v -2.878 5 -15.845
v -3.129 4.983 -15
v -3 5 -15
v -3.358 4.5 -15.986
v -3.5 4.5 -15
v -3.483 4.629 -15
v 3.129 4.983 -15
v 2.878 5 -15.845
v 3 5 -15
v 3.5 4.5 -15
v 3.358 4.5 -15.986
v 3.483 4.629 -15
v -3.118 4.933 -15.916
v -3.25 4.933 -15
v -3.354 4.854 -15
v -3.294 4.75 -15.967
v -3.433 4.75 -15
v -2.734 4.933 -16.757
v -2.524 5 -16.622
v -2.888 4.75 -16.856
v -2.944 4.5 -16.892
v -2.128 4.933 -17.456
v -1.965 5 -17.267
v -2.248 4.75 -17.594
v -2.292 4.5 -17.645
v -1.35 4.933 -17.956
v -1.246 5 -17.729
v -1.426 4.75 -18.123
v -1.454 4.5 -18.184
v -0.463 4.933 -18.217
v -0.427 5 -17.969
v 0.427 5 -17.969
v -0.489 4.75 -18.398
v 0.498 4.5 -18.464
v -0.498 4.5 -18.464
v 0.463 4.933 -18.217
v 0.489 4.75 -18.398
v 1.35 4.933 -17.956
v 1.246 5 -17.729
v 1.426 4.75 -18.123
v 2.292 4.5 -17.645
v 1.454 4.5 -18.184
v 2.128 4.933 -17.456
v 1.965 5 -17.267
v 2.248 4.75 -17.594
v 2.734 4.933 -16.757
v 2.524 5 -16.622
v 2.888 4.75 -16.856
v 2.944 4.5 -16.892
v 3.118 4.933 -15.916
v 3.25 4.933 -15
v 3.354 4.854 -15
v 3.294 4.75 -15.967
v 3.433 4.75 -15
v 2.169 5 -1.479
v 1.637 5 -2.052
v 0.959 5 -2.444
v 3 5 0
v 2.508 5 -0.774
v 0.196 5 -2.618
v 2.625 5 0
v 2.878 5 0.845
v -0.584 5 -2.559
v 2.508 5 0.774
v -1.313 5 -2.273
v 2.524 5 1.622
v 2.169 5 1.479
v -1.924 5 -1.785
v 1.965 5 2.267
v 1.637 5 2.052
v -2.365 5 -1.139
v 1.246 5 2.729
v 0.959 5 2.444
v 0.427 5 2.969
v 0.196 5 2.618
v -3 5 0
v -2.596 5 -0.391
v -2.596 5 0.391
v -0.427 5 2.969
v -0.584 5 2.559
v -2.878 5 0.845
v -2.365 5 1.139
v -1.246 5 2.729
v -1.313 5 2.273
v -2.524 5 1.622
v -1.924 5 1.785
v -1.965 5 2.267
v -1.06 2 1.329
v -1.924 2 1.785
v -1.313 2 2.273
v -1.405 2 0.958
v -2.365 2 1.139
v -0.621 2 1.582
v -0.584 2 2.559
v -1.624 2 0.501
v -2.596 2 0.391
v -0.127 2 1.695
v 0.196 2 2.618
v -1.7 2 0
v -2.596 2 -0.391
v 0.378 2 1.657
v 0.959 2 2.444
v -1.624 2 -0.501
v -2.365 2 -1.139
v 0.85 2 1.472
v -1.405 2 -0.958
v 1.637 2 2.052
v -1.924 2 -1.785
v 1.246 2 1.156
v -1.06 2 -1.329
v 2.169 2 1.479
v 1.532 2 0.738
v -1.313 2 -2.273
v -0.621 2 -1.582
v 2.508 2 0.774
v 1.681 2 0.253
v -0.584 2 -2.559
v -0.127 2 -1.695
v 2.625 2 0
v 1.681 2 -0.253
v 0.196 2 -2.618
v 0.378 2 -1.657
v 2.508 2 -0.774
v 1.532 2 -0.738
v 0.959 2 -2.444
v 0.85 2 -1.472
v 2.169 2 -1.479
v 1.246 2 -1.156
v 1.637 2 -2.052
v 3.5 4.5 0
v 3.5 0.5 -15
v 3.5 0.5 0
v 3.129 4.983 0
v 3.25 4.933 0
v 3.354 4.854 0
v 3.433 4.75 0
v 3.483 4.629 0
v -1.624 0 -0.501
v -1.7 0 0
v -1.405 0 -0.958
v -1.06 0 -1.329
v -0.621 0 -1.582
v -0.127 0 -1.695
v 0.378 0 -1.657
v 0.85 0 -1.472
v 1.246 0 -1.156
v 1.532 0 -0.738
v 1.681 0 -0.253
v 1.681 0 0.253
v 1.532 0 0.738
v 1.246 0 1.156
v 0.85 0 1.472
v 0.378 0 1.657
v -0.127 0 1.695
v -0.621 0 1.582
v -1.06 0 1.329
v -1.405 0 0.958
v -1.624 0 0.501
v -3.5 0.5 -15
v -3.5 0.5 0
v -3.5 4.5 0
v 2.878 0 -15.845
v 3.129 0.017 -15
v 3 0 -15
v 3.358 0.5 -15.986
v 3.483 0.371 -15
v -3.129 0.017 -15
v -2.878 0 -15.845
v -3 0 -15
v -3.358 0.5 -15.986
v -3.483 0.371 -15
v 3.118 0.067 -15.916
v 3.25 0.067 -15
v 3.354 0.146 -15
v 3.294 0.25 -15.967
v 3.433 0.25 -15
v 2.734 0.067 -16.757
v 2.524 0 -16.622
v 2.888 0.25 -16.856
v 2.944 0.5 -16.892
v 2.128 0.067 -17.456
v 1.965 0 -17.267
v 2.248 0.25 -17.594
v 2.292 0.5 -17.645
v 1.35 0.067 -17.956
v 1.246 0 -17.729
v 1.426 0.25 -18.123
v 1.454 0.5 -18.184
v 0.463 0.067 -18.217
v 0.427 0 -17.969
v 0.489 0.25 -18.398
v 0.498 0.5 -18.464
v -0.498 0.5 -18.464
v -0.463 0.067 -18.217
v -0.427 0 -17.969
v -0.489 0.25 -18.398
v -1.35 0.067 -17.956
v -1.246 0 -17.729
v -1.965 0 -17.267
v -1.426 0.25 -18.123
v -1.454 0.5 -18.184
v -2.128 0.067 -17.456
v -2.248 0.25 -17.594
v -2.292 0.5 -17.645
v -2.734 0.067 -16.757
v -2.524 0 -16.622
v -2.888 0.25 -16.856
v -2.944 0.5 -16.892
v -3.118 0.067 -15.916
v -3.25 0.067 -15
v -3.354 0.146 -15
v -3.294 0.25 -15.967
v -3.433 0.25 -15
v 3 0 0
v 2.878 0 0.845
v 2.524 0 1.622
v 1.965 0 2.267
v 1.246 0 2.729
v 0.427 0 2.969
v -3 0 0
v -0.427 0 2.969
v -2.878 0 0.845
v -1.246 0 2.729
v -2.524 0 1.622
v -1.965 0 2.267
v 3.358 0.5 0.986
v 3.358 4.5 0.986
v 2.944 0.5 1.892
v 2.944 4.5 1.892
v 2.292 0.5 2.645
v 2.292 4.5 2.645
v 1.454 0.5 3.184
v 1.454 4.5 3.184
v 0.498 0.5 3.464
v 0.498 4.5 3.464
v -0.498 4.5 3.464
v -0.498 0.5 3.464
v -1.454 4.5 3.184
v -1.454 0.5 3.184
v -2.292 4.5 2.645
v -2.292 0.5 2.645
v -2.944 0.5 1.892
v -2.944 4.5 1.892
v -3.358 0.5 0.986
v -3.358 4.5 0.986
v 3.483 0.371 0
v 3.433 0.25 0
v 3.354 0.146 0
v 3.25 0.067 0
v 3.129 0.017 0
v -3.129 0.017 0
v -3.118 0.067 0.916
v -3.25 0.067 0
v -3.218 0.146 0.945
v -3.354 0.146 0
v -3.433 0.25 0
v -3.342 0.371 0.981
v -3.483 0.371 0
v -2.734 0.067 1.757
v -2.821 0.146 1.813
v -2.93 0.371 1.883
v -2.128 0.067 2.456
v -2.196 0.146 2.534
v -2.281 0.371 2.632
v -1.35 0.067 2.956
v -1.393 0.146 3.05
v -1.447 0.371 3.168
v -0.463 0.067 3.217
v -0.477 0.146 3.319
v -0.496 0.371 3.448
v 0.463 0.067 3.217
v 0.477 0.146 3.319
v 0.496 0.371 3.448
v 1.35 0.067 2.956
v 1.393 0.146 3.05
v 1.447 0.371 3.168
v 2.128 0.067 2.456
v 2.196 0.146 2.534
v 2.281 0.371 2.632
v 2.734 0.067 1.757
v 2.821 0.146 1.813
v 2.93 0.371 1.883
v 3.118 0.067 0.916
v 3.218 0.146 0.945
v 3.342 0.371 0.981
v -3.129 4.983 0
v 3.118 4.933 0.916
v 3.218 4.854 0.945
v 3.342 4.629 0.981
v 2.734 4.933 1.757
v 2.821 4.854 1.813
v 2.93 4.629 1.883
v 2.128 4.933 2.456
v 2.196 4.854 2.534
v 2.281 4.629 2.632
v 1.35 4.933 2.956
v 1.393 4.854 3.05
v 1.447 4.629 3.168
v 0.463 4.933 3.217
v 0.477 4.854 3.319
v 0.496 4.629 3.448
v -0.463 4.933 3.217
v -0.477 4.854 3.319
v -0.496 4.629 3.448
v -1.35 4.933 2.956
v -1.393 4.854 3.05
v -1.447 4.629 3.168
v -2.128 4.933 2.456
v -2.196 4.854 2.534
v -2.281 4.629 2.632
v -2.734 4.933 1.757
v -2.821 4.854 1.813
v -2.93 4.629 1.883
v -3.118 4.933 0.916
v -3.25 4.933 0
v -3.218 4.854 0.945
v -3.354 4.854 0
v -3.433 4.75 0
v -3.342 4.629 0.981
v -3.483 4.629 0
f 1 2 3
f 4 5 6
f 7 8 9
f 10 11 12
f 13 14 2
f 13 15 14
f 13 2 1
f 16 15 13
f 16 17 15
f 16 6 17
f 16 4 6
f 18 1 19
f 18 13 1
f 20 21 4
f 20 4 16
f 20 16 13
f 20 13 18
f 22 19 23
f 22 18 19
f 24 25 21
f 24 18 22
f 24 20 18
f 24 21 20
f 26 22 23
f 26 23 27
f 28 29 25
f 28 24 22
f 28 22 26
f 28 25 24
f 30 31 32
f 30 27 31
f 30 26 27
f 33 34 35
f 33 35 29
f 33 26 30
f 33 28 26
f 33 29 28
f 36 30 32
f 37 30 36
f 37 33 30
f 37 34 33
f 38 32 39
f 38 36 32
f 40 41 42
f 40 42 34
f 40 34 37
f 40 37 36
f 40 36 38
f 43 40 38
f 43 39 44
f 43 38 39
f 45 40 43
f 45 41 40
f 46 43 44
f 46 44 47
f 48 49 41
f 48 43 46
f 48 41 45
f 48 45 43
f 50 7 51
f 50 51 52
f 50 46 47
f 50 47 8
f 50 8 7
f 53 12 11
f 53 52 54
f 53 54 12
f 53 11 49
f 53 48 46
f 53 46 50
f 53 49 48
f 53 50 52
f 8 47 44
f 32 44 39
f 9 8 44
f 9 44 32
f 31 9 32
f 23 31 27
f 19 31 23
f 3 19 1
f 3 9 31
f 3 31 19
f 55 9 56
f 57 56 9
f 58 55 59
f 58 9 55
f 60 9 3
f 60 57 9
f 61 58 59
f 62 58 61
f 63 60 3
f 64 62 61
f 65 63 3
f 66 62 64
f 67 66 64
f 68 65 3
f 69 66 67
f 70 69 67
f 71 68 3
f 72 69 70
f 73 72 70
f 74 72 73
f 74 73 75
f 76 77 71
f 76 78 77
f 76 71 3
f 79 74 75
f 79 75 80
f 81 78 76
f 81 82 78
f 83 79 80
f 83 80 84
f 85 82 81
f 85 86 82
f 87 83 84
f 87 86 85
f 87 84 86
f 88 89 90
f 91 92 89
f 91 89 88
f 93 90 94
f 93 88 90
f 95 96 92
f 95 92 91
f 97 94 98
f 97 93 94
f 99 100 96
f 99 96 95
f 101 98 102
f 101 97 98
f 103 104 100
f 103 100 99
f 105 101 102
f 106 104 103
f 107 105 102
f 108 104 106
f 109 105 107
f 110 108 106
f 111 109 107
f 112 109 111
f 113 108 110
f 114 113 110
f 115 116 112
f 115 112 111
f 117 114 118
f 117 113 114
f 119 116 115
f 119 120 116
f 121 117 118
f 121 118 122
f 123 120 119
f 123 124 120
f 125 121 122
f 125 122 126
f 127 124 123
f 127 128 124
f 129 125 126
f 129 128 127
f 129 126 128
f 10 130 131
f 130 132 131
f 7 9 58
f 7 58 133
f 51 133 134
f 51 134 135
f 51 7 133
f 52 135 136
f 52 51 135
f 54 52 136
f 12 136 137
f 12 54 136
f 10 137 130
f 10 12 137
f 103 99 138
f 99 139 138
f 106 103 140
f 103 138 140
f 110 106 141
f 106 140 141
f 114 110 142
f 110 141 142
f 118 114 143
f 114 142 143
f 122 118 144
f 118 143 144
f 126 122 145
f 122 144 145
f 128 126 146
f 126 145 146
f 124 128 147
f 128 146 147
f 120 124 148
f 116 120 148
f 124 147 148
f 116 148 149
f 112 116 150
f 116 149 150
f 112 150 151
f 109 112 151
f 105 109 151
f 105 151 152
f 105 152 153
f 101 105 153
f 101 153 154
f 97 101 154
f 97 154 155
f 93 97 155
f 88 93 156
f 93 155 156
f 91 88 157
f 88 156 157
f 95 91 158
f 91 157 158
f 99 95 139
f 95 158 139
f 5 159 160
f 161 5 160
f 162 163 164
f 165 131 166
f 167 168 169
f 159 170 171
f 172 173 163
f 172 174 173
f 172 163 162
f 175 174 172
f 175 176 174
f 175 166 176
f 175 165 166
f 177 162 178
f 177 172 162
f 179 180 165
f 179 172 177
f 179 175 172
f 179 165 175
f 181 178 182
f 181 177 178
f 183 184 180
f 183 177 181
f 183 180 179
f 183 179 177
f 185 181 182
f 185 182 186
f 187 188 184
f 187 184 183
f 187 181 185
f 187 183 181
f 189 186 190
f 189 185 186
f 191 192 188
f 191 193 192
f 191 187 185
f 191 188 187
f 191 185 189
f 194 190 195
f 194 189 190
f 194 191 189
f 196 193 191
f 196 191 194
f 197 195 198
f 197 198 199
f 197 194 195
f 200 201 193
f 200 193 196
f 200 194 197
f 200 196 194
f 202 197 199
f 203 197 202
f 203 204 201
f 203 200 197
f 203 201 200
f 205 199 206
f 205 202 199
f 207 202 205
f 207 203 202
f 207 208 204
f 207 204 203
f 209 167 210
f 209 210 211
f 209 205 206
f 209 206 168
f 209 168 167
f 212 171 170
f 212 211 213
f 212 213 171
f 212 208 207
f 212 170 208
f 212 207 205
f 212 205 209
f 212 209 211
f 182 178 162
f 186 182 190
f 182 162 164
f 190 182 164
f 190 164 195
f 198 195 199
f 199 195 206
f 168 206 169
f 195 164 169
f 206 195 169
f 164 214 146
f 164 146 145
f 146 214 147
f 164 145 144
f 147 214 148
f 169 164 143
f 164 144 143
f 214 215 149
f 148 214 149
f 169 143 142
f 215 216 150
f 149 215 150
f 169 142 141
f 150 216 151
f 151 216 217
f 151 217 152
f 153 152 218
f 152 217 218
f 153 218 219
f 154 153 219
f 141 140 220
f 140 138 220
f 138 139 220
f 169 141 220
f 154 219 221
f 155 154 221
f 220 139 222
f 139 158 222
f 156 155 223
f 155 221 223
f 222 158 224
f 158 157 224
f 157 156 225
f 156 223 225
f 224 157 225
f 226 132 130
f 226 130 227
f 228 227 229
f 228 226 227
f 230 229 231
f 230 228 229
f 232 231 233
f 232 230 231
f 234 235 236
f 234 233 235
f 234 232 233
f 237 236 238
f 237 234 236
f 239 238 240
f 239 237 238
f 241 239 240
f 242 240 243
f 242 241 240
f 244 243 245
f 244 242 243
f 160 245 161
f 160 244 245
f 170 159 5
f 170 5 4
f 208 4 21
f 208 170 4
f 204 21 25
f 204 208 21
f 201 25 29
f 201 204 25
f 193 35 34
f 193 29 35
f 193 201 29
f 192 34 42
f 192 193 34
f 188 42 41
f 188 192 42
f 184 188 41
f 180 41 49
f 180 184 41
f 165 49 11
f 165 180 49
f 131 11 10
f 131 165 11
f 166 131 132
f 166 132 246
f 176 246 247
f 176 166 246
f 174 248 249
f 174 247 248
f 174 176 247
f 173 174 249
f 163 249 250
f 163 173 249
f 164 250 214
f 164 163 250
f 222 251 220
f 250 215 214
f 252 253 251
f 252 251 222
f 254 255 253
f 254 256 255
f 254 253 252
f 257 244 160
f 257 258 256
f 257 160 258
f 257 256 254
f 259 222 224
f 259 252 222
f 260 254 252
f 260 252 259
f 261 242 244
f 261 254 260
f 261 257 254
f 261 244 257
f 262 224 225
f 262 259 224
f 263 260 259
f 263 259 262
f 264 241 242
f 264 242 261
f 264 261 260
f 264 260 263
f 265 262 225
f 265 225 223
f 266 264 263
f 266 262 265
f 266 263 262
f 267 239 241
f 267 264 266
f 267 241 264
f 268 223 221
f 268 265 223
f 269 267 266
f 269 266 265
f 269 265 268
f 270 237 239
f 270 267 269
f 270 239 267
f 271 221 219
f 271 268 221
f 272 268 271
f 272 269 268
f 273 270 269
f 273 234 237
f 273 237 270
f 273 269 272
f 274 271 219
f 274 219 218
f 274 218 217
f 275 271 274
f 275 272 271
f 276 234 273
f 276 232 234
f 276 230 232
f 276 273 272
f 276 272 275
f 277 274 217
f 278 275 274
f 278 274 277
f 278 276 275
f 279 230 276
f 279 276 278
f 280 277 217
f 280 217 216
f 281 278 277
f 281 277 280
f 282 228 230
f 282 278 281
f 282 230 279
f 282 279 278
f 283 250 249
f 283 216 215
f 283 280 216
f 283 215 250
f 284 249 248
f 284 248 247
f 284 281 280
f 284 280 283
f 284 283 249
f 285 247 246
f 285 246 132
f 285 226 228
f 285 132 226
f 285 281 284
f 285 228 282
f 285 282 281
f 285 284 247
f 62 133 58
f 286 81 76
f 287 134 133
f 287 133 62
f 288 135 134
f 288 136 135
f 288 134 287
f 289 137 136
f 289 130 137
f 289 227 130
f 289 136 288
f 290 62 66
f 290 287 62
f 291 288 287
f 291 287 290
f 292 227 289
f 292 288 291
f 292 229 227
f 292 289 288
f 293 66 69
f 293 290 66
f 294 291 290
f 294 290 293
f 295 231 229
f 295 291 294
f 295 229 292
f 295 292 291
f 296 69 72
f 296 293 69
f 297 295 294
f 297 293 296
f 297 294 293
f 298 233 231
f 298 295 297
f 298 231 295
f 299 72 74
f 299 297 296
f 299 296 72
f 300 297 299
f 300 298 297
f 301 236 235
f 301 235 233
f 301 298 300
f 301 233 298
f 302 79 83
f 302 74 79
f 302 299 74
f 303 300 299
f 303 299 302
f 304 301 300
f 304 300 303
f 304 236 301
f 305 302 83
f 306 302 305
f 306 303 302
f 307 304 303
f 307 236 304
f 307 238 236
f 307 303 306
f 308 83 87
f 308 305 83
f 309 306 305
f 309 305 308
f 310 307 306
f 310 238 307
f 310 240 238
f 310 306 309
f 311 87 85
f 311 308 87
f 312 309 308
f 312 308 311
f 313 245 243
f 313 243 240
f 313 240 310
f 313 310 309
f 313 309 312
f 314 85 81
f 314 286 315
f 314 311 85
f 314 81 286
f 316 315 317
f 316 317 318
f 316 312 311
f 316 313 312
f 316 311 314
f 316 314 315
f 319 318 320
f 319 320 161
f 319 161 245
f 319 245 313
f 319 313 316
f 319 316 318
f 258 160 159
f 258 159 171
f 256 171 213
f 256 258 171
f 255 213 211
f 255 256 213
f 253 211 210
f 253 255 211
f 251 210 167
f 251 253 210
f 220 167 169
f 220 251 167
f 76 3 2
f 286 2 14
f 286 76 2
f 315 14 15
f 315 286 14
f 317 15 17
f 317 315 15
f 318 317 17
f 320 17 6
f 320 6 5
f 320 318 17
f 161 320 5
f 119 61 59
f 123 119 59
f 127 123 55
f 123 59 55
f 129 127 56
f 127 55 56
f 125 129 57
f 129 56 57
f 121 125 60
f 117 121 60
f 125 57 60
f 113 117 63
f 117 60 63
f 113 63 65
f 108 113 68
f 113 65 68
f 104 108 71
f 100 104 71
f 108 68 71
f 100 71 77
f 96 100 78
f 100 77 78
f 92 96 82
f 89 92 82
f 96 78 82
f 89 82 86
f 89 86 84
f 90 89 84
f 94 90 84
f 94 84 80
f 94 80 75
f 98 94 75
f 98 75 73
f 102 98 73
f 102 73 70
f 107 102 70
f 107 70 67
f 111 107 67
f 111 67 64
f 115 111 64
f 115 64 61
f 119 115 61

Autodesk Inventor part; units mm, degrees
ref_plane "YZ Plane" through (0, 0, 0) normal (1, 0, 0) x (0, 1, 0)
ref_plane "XZ Plane" through (0, 0, 0) normal (0, 1, 0) x (-1, 0, 0)
ref_plane "XY Plane" through (0, 0, 0) normal (0, 0, 1) x (1, 0, 0)
sketch "Sketch1" plane through (0, 0, 0) normal (0, 1, 0) x (-1, 0, 0)
  line L0 (0, 0) -> (0, -15) construction
  line L1 (-3.5, 0) -> (-3.5, -15)
  line L2 (3.5, -15) -> (3.5, 0)
  arc A0 (3.5, 0) -> (-3.5, 0) centre (0, 0) ccw
  arc A1 (-3.5, -15) -> (3.5, -15) centre (0, -15) ccw
  circle A2 centre (0, 0) radius 1.7
  point P0 (0, -7.5)
  dimension "d0" = 7
  dimension "d1" = 15
  dimension "d2" = 3.4
extrude "Extrusion1" add sketch "Sketch1" along normal blind 5
sketch "Sketch2" plane through (0, 5, 0) normal (0, 1, 0) x (1, 0, 0)
  circle A0 centre (0, 0) radius 2.625
  dimension "d5" = 5.25
extrude "Extrusion2" cut sketch "Sketch2" against normal blind 3
fillet "Fillet1" radius 0.5 8 edges at (0, 0, -18.5) (-3.5, 0, -7.5) (0, 0, 3.5) (3.5, 0, -7.5) (0, 5, -18.5) (-3.5, 5, -7.5) (0, 5, 3.5) (3.5, 5, -7.5)
properties part number "v2batterylock"
